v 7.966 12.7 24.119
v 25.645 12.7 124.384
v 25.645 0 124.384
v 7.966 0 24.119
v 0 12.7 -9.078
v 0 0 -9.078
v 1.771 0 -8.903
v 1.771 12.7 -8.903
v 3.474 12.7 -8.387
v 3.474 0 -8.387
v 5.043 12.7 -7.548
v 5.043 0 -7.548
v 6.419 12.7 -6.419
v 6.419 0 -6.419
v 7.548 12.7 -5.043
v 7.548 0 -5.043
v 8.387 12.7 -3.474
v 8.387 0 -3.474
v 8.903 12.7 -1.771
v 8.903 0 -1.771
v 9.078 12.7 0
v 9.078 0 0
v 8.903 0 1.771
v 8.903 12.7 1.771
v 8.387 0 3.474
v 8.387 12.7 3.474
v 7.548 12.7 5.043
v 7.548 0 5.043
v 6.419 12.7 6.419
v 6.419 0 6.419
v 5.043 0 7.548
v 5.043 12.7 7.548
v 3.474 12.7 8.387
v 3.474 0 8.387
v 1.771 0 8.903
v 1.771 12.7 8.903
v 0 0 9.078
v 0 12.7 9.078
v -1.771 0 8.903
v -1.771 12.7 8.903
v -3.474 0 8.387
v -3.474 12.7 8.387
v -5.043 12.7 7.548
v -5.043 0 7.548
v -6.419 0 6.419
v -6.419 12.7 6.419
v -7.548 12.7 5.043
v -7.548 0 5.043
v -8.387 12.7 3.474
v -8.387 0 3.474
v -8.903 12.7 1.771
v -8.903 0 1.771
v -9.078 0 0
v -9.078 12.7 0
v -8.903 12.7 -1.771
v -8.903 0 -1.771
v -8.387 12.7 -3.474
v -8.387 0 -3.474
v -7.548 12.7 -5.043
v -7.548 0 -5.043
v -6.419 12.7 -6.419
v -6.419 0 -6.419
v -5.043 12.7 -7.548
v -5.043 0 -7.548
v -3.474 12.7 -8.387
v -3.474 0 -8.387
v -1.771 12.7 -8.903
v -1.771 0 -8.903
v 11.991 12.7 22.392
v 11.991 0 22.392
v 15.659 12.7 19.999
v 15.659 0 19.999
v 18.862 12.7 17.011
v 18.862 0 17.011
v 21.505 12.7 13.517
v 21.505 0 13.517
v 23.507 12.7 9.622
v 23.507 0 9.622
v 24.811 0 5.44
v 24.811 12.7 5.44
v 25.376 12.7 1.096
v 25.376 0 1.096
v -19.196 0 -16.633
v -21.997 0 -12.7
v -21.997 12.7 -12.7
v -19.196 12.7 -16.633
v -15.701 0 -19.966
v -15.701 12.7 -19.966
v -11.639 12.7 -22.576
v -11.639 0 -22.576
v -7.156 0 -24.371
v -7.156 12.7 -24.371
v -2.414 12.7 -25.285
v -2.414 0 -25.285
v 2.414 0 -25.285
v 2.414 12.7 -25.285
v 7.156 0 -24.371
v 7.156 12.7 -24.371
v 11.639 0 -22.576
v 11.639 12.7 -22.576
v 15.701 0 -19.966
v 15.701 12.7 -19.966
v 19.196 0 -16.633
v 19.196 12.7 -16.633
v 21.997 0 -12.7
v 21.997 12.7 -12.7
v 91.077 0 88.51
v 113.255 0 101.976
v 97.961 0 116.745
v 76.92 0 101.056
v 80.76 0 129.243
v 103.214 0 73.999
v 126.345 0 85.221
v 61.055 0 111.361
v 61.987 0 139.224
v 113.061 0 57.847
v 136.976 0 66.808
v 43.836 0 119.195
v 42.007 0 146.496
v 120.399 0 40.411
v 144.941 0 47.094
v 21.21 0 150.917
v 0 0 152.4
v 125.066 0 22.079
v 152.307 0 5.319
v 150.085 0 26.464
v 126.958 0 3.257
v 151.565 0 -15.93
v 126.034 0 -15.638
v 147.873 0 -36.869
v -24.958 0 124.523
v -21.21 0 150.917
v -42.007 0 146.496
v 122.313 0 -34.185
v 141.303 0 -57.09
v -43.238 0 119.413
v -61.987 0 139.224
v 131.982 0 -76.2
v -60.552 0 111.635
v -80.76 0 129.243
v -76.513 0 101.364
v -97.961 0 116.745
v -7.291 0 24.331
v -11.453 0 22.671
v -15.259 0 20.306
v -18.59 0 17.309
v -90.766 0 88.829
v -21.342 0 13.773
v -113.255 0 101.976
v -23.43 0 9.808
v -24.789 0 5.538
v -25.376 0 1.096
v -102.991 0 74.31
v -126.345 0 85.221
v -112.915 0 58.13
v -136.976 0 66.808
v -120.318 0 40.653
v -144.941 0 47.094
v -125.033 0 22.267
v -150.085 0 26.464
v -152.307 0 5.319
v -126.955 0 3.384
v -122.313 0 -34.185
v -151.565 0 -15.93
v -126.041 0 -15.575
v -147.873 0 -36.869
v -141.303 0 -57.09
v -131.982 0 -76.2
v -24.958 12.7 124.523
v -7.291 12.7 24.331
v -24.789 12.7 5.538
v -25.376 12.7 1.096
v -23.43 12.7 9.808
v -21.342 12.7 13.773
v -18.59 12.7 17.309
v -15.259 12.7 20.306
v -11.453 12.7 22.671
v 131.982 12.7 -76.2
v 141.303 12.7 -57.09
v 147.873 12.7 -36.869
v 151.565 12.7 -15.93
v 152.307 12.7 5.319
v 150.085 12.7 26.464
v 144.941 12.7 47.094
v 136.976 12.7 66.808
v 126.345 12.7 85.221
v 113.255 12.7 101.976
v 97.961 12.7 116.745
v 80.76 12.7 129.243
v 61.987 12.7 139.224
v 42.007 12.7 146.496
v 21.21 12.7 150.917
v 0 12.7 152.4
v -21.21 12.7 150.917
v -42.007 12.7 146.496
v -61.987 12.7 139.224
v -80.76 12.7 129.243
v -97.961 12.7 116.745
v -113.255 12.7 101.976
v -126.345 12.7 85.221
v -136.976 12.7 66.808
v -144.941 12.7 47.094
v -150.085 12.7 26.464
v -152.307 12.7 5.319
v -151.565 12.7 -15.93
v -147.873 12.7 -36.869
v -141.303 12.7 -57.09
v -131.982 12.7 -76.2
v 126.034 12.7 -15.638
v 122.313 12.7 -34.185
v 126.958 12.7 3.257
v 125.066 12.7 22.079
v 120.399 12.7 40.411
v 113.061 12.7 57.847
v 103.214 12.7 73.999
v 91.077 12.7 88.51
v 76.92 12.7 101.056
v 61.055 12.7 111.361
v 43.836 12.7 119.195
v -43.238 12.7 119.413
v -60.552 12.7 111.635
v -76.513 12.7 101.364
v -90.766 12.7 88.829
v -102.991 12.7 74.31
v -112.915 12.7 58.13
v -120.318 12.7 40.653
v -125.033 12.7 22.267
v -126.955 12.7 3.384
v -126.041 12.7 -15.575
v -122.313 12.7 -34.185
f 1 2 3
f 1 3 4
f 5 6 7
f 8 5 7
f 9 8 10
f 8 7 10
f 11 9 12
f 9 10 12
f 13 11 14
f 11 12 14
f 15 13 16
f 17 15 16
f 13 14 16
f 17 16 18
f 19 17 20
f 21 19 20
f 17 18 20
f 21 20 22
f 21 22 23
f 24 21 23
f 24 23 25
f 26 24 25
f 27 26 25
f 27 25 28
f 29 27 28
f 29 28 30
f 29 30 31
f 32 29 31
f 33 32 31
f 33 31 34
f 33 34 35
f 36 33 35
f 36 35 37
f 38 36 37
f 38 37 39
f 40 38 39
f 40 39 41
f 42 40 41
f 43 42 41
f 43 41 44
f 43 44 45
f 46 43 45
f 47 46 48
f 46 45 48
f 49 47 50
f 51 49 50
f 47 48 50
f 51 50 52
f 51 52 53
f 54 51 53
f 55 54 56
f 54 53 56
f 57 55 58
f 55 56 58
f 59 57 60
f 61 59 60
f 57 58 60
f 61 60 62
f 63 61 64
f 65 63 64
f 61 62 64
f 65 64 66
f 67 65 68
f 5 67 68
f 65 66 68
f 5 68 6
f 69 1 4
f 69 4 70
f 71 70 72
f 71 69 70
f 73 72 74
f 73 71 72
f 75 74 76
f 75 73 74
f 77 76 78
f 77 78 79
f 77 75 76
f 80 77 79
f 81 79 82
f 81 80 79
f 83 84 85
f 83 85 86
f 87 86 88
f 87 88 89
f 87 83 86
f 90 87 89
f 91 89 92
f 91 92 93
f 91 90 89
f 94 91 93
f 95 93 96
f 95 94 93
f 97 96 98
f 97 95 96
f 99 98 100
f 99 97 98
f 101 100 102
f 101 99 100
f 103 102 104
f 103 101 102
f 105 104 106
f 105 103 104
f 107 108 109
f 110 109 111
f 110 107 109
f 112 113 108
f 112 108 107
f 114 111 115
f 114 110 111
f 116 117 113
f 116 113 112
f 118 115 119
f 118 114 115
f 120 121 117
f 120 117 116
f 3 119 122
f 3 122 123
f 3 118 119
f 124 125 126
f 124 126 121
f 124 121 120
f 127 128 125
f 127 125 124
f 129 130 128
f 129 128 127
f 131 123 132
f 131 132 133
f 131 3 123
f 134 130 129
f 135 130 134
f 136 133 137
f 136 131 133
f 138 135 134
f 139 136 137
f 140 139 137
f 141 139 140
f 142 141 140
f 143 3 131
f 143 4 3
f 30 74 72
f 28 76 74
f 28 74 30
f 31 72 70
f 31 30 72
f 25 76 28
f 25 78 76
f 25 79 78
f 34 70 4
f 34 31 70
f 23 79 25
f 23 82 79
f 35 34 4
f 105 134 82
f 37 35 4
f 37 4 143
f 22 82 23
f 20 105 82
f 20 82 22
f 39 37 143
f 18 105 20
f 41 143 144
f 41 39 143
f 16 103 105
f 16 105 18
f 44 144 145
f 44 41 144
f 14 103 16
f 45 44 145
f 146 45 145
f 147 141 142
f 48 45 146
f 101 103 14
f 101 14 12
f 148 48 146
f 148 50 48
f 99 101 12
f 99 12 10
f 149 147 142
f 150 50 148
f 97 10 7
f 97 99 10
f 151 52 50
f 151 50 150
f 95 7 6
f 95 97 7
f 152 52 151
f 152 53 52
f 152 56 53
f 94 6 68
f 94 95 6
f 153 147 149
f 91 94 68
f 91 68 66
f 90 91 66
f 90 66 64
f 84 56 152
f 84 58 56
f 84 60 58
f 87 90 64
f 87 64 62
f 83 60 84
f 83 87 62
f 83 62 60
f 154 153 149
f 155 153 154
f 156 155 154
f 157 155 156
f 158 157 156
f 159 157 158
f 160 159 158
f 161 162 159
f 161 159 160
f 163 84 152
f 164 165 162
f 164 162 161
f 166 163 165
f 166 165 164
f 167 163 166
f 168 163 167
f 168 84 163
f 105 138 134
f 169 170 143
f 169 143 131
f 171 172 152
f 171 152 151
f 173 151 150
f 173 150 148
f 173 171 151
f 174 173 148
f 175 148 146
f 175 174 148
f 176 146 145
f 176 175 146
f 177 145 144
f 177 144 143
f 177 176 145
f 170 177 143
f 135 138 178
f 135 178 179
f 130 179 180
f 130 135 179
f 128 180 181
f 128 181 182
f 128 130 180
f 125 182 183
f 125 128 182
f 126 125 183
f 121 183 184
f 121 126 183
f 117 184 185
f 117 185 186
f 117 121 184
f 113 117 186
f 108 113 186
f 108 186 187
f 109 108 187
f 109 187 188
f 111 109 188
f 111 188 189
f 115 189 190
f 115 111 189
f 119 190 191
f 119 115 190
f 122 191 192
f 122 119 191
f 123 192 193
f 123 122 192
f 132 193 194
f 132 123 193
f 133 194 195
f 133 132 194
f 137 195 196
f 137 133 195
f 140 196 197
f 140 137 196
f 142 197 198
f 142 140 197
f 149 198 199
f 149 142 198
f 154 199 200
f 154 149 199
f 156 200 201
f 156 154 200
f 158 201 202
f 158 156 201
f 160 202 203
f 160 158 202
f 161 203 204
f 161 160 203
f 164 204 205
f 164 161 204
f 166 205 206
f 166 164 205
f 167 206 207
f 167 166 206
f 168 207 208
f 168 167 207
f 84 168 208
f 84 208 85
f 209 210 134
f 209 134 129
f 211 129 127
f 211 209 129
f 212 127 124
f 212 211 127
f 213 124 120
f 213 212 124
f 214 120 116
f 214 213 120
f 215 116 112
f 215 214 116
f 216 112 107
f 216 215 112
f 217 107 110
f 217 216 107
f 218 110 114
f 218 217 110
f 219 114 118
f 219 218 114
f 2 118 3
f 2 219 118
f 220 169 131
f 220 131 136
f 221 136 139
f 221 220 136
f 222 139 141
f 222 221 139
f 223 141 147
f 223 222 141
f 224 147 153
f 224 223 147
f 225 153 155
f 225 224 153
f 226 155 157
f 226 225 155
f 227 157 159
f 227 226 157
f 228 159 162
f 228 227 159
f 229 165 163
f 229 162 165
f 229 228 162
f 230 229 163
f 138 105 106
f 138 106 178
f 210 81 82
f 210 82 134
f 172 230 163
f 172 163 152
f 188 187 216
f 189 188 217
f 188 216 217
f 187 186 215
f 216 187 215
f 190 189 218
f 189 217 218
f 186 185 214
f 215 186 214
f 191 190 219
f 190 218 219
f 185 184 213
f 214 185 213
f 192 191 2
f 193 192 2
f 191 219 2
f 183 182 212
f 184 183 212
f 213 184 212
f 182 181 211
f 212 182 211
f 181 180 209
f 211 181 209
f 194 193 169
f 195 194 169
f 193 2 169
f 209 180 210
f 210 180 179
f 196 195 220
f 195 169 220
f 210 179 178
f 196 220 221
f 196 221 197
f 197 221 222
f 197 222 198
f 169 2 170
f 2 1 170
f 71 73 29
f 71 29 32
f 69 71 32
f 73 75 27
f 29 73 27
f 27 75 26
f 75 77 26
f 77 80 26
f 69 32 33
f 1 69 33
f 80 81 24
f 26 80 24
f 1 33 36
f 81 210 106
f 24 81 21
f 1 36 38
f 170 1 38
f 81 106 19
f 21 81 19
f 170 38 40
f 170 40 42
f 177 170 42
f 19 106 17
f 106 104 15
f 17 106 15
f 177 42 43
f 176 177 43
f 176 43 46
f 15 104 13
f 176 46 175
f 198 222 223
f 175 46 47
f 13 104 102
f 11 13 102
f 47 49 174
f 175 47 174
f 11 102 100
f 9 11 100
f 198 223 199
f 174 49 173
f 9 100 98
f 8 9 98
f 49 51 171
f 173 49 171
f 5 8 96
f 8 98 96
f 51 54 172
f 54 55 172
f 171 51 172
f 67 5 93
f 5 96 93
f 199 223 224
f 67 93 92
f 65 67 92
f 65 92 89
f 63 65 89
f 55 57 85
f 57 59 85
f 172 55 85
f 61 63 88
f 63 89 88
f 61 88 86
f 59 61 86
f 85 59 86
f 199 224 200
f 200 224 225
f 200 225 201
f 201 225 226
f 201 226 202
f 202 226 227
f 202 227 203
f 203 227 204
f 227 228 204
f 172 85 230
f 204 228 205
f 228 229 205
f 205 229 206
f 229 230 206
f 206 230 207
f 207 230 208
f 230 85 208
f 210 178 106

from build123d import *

# Parameters (mm, degrees)
EXTRUDE1_DEPTH = 12.7
EXTRUDE2_DEPTH = 216.9
SKETCH8_R      = 9.07761974
EXTRUDE3_DEPTH = 216.9


with BuildPart() as part:
    # Sketch1 → Extrude1 (new body)
    with BuildSketch(Plane(origin=(0, 0, 0), x_dir=(1, 0, 0), z_dir=(0, 1, 0))):
        with BuildLine():
            Line((-131.982271537, 76.2), (-21.997045256, 12.7))
            ThreePointArc((-21.997045256, 12.7), (0, 25.4), (21.997045256, 12.7))
            Line((21.997045256, 12.7), (131.982271537, 76.2))
            ThreePointArc((131.982271537, 76.2), (0, -152.4), (-131.982271537, 76.2))
        make_face()
    extrude(amount=EXTRUDE1_DEPTH)

    # Sketch2 → Extrude2 (cut, through all)
    with BuildSketch(Plane(origin=(0, 12.7, 0), x_dir=(1, 0, 0), z_dir=(0, 1, 0))):
        with BuildLine():
            Line((-122.312523376, 34.185473895), (-25.376324988, -1.096416941))
            ThreePointArc((-25.376324988, -1.096416941), (-20.043874739, -15.601380882), (-7.29146874, -24.33093676))
            Line((-7.29146874, -24.33093676), (-24.958114169, -124.523461794))
            ThreePointArc((-24.958114169, -124.523461794), (-108.255677623, -66.405634267), (-122.312523376, 34.185473895))
        make_face()
        with BuildLine():
            Line((25.376324988, -1.096416941), (122.312523376, 34.185473895))
            ThreePointArc((122.312523376, 34.185473895), (108.43851372, -66.106646732), (25.644983679, -124.38382054))
            Line((25.644983679, -124.38382054), (7.965532589, -24.118670995))
            ThreePointArc((7.965532589, -24.118670995), (20.258971151, -15.321034165), (25.376324988, -1.096416941))
        make_face()
    extrude(amount=-EXTRUDE2_DEPTH, mode=Mode.SUBTRACT)

    # Sketch8 → Extrude3 (cut, through all)
    with BuildSketch(Plane.XZ):
        with Locations(Location((0, 0, 0), (0, 0, 270))):
            Circle(SKETCH8_R)
    extrude(amount=-EXTRUDE3_DEPTH, mode=Mode.SUBTRACT)


solid = part.part
